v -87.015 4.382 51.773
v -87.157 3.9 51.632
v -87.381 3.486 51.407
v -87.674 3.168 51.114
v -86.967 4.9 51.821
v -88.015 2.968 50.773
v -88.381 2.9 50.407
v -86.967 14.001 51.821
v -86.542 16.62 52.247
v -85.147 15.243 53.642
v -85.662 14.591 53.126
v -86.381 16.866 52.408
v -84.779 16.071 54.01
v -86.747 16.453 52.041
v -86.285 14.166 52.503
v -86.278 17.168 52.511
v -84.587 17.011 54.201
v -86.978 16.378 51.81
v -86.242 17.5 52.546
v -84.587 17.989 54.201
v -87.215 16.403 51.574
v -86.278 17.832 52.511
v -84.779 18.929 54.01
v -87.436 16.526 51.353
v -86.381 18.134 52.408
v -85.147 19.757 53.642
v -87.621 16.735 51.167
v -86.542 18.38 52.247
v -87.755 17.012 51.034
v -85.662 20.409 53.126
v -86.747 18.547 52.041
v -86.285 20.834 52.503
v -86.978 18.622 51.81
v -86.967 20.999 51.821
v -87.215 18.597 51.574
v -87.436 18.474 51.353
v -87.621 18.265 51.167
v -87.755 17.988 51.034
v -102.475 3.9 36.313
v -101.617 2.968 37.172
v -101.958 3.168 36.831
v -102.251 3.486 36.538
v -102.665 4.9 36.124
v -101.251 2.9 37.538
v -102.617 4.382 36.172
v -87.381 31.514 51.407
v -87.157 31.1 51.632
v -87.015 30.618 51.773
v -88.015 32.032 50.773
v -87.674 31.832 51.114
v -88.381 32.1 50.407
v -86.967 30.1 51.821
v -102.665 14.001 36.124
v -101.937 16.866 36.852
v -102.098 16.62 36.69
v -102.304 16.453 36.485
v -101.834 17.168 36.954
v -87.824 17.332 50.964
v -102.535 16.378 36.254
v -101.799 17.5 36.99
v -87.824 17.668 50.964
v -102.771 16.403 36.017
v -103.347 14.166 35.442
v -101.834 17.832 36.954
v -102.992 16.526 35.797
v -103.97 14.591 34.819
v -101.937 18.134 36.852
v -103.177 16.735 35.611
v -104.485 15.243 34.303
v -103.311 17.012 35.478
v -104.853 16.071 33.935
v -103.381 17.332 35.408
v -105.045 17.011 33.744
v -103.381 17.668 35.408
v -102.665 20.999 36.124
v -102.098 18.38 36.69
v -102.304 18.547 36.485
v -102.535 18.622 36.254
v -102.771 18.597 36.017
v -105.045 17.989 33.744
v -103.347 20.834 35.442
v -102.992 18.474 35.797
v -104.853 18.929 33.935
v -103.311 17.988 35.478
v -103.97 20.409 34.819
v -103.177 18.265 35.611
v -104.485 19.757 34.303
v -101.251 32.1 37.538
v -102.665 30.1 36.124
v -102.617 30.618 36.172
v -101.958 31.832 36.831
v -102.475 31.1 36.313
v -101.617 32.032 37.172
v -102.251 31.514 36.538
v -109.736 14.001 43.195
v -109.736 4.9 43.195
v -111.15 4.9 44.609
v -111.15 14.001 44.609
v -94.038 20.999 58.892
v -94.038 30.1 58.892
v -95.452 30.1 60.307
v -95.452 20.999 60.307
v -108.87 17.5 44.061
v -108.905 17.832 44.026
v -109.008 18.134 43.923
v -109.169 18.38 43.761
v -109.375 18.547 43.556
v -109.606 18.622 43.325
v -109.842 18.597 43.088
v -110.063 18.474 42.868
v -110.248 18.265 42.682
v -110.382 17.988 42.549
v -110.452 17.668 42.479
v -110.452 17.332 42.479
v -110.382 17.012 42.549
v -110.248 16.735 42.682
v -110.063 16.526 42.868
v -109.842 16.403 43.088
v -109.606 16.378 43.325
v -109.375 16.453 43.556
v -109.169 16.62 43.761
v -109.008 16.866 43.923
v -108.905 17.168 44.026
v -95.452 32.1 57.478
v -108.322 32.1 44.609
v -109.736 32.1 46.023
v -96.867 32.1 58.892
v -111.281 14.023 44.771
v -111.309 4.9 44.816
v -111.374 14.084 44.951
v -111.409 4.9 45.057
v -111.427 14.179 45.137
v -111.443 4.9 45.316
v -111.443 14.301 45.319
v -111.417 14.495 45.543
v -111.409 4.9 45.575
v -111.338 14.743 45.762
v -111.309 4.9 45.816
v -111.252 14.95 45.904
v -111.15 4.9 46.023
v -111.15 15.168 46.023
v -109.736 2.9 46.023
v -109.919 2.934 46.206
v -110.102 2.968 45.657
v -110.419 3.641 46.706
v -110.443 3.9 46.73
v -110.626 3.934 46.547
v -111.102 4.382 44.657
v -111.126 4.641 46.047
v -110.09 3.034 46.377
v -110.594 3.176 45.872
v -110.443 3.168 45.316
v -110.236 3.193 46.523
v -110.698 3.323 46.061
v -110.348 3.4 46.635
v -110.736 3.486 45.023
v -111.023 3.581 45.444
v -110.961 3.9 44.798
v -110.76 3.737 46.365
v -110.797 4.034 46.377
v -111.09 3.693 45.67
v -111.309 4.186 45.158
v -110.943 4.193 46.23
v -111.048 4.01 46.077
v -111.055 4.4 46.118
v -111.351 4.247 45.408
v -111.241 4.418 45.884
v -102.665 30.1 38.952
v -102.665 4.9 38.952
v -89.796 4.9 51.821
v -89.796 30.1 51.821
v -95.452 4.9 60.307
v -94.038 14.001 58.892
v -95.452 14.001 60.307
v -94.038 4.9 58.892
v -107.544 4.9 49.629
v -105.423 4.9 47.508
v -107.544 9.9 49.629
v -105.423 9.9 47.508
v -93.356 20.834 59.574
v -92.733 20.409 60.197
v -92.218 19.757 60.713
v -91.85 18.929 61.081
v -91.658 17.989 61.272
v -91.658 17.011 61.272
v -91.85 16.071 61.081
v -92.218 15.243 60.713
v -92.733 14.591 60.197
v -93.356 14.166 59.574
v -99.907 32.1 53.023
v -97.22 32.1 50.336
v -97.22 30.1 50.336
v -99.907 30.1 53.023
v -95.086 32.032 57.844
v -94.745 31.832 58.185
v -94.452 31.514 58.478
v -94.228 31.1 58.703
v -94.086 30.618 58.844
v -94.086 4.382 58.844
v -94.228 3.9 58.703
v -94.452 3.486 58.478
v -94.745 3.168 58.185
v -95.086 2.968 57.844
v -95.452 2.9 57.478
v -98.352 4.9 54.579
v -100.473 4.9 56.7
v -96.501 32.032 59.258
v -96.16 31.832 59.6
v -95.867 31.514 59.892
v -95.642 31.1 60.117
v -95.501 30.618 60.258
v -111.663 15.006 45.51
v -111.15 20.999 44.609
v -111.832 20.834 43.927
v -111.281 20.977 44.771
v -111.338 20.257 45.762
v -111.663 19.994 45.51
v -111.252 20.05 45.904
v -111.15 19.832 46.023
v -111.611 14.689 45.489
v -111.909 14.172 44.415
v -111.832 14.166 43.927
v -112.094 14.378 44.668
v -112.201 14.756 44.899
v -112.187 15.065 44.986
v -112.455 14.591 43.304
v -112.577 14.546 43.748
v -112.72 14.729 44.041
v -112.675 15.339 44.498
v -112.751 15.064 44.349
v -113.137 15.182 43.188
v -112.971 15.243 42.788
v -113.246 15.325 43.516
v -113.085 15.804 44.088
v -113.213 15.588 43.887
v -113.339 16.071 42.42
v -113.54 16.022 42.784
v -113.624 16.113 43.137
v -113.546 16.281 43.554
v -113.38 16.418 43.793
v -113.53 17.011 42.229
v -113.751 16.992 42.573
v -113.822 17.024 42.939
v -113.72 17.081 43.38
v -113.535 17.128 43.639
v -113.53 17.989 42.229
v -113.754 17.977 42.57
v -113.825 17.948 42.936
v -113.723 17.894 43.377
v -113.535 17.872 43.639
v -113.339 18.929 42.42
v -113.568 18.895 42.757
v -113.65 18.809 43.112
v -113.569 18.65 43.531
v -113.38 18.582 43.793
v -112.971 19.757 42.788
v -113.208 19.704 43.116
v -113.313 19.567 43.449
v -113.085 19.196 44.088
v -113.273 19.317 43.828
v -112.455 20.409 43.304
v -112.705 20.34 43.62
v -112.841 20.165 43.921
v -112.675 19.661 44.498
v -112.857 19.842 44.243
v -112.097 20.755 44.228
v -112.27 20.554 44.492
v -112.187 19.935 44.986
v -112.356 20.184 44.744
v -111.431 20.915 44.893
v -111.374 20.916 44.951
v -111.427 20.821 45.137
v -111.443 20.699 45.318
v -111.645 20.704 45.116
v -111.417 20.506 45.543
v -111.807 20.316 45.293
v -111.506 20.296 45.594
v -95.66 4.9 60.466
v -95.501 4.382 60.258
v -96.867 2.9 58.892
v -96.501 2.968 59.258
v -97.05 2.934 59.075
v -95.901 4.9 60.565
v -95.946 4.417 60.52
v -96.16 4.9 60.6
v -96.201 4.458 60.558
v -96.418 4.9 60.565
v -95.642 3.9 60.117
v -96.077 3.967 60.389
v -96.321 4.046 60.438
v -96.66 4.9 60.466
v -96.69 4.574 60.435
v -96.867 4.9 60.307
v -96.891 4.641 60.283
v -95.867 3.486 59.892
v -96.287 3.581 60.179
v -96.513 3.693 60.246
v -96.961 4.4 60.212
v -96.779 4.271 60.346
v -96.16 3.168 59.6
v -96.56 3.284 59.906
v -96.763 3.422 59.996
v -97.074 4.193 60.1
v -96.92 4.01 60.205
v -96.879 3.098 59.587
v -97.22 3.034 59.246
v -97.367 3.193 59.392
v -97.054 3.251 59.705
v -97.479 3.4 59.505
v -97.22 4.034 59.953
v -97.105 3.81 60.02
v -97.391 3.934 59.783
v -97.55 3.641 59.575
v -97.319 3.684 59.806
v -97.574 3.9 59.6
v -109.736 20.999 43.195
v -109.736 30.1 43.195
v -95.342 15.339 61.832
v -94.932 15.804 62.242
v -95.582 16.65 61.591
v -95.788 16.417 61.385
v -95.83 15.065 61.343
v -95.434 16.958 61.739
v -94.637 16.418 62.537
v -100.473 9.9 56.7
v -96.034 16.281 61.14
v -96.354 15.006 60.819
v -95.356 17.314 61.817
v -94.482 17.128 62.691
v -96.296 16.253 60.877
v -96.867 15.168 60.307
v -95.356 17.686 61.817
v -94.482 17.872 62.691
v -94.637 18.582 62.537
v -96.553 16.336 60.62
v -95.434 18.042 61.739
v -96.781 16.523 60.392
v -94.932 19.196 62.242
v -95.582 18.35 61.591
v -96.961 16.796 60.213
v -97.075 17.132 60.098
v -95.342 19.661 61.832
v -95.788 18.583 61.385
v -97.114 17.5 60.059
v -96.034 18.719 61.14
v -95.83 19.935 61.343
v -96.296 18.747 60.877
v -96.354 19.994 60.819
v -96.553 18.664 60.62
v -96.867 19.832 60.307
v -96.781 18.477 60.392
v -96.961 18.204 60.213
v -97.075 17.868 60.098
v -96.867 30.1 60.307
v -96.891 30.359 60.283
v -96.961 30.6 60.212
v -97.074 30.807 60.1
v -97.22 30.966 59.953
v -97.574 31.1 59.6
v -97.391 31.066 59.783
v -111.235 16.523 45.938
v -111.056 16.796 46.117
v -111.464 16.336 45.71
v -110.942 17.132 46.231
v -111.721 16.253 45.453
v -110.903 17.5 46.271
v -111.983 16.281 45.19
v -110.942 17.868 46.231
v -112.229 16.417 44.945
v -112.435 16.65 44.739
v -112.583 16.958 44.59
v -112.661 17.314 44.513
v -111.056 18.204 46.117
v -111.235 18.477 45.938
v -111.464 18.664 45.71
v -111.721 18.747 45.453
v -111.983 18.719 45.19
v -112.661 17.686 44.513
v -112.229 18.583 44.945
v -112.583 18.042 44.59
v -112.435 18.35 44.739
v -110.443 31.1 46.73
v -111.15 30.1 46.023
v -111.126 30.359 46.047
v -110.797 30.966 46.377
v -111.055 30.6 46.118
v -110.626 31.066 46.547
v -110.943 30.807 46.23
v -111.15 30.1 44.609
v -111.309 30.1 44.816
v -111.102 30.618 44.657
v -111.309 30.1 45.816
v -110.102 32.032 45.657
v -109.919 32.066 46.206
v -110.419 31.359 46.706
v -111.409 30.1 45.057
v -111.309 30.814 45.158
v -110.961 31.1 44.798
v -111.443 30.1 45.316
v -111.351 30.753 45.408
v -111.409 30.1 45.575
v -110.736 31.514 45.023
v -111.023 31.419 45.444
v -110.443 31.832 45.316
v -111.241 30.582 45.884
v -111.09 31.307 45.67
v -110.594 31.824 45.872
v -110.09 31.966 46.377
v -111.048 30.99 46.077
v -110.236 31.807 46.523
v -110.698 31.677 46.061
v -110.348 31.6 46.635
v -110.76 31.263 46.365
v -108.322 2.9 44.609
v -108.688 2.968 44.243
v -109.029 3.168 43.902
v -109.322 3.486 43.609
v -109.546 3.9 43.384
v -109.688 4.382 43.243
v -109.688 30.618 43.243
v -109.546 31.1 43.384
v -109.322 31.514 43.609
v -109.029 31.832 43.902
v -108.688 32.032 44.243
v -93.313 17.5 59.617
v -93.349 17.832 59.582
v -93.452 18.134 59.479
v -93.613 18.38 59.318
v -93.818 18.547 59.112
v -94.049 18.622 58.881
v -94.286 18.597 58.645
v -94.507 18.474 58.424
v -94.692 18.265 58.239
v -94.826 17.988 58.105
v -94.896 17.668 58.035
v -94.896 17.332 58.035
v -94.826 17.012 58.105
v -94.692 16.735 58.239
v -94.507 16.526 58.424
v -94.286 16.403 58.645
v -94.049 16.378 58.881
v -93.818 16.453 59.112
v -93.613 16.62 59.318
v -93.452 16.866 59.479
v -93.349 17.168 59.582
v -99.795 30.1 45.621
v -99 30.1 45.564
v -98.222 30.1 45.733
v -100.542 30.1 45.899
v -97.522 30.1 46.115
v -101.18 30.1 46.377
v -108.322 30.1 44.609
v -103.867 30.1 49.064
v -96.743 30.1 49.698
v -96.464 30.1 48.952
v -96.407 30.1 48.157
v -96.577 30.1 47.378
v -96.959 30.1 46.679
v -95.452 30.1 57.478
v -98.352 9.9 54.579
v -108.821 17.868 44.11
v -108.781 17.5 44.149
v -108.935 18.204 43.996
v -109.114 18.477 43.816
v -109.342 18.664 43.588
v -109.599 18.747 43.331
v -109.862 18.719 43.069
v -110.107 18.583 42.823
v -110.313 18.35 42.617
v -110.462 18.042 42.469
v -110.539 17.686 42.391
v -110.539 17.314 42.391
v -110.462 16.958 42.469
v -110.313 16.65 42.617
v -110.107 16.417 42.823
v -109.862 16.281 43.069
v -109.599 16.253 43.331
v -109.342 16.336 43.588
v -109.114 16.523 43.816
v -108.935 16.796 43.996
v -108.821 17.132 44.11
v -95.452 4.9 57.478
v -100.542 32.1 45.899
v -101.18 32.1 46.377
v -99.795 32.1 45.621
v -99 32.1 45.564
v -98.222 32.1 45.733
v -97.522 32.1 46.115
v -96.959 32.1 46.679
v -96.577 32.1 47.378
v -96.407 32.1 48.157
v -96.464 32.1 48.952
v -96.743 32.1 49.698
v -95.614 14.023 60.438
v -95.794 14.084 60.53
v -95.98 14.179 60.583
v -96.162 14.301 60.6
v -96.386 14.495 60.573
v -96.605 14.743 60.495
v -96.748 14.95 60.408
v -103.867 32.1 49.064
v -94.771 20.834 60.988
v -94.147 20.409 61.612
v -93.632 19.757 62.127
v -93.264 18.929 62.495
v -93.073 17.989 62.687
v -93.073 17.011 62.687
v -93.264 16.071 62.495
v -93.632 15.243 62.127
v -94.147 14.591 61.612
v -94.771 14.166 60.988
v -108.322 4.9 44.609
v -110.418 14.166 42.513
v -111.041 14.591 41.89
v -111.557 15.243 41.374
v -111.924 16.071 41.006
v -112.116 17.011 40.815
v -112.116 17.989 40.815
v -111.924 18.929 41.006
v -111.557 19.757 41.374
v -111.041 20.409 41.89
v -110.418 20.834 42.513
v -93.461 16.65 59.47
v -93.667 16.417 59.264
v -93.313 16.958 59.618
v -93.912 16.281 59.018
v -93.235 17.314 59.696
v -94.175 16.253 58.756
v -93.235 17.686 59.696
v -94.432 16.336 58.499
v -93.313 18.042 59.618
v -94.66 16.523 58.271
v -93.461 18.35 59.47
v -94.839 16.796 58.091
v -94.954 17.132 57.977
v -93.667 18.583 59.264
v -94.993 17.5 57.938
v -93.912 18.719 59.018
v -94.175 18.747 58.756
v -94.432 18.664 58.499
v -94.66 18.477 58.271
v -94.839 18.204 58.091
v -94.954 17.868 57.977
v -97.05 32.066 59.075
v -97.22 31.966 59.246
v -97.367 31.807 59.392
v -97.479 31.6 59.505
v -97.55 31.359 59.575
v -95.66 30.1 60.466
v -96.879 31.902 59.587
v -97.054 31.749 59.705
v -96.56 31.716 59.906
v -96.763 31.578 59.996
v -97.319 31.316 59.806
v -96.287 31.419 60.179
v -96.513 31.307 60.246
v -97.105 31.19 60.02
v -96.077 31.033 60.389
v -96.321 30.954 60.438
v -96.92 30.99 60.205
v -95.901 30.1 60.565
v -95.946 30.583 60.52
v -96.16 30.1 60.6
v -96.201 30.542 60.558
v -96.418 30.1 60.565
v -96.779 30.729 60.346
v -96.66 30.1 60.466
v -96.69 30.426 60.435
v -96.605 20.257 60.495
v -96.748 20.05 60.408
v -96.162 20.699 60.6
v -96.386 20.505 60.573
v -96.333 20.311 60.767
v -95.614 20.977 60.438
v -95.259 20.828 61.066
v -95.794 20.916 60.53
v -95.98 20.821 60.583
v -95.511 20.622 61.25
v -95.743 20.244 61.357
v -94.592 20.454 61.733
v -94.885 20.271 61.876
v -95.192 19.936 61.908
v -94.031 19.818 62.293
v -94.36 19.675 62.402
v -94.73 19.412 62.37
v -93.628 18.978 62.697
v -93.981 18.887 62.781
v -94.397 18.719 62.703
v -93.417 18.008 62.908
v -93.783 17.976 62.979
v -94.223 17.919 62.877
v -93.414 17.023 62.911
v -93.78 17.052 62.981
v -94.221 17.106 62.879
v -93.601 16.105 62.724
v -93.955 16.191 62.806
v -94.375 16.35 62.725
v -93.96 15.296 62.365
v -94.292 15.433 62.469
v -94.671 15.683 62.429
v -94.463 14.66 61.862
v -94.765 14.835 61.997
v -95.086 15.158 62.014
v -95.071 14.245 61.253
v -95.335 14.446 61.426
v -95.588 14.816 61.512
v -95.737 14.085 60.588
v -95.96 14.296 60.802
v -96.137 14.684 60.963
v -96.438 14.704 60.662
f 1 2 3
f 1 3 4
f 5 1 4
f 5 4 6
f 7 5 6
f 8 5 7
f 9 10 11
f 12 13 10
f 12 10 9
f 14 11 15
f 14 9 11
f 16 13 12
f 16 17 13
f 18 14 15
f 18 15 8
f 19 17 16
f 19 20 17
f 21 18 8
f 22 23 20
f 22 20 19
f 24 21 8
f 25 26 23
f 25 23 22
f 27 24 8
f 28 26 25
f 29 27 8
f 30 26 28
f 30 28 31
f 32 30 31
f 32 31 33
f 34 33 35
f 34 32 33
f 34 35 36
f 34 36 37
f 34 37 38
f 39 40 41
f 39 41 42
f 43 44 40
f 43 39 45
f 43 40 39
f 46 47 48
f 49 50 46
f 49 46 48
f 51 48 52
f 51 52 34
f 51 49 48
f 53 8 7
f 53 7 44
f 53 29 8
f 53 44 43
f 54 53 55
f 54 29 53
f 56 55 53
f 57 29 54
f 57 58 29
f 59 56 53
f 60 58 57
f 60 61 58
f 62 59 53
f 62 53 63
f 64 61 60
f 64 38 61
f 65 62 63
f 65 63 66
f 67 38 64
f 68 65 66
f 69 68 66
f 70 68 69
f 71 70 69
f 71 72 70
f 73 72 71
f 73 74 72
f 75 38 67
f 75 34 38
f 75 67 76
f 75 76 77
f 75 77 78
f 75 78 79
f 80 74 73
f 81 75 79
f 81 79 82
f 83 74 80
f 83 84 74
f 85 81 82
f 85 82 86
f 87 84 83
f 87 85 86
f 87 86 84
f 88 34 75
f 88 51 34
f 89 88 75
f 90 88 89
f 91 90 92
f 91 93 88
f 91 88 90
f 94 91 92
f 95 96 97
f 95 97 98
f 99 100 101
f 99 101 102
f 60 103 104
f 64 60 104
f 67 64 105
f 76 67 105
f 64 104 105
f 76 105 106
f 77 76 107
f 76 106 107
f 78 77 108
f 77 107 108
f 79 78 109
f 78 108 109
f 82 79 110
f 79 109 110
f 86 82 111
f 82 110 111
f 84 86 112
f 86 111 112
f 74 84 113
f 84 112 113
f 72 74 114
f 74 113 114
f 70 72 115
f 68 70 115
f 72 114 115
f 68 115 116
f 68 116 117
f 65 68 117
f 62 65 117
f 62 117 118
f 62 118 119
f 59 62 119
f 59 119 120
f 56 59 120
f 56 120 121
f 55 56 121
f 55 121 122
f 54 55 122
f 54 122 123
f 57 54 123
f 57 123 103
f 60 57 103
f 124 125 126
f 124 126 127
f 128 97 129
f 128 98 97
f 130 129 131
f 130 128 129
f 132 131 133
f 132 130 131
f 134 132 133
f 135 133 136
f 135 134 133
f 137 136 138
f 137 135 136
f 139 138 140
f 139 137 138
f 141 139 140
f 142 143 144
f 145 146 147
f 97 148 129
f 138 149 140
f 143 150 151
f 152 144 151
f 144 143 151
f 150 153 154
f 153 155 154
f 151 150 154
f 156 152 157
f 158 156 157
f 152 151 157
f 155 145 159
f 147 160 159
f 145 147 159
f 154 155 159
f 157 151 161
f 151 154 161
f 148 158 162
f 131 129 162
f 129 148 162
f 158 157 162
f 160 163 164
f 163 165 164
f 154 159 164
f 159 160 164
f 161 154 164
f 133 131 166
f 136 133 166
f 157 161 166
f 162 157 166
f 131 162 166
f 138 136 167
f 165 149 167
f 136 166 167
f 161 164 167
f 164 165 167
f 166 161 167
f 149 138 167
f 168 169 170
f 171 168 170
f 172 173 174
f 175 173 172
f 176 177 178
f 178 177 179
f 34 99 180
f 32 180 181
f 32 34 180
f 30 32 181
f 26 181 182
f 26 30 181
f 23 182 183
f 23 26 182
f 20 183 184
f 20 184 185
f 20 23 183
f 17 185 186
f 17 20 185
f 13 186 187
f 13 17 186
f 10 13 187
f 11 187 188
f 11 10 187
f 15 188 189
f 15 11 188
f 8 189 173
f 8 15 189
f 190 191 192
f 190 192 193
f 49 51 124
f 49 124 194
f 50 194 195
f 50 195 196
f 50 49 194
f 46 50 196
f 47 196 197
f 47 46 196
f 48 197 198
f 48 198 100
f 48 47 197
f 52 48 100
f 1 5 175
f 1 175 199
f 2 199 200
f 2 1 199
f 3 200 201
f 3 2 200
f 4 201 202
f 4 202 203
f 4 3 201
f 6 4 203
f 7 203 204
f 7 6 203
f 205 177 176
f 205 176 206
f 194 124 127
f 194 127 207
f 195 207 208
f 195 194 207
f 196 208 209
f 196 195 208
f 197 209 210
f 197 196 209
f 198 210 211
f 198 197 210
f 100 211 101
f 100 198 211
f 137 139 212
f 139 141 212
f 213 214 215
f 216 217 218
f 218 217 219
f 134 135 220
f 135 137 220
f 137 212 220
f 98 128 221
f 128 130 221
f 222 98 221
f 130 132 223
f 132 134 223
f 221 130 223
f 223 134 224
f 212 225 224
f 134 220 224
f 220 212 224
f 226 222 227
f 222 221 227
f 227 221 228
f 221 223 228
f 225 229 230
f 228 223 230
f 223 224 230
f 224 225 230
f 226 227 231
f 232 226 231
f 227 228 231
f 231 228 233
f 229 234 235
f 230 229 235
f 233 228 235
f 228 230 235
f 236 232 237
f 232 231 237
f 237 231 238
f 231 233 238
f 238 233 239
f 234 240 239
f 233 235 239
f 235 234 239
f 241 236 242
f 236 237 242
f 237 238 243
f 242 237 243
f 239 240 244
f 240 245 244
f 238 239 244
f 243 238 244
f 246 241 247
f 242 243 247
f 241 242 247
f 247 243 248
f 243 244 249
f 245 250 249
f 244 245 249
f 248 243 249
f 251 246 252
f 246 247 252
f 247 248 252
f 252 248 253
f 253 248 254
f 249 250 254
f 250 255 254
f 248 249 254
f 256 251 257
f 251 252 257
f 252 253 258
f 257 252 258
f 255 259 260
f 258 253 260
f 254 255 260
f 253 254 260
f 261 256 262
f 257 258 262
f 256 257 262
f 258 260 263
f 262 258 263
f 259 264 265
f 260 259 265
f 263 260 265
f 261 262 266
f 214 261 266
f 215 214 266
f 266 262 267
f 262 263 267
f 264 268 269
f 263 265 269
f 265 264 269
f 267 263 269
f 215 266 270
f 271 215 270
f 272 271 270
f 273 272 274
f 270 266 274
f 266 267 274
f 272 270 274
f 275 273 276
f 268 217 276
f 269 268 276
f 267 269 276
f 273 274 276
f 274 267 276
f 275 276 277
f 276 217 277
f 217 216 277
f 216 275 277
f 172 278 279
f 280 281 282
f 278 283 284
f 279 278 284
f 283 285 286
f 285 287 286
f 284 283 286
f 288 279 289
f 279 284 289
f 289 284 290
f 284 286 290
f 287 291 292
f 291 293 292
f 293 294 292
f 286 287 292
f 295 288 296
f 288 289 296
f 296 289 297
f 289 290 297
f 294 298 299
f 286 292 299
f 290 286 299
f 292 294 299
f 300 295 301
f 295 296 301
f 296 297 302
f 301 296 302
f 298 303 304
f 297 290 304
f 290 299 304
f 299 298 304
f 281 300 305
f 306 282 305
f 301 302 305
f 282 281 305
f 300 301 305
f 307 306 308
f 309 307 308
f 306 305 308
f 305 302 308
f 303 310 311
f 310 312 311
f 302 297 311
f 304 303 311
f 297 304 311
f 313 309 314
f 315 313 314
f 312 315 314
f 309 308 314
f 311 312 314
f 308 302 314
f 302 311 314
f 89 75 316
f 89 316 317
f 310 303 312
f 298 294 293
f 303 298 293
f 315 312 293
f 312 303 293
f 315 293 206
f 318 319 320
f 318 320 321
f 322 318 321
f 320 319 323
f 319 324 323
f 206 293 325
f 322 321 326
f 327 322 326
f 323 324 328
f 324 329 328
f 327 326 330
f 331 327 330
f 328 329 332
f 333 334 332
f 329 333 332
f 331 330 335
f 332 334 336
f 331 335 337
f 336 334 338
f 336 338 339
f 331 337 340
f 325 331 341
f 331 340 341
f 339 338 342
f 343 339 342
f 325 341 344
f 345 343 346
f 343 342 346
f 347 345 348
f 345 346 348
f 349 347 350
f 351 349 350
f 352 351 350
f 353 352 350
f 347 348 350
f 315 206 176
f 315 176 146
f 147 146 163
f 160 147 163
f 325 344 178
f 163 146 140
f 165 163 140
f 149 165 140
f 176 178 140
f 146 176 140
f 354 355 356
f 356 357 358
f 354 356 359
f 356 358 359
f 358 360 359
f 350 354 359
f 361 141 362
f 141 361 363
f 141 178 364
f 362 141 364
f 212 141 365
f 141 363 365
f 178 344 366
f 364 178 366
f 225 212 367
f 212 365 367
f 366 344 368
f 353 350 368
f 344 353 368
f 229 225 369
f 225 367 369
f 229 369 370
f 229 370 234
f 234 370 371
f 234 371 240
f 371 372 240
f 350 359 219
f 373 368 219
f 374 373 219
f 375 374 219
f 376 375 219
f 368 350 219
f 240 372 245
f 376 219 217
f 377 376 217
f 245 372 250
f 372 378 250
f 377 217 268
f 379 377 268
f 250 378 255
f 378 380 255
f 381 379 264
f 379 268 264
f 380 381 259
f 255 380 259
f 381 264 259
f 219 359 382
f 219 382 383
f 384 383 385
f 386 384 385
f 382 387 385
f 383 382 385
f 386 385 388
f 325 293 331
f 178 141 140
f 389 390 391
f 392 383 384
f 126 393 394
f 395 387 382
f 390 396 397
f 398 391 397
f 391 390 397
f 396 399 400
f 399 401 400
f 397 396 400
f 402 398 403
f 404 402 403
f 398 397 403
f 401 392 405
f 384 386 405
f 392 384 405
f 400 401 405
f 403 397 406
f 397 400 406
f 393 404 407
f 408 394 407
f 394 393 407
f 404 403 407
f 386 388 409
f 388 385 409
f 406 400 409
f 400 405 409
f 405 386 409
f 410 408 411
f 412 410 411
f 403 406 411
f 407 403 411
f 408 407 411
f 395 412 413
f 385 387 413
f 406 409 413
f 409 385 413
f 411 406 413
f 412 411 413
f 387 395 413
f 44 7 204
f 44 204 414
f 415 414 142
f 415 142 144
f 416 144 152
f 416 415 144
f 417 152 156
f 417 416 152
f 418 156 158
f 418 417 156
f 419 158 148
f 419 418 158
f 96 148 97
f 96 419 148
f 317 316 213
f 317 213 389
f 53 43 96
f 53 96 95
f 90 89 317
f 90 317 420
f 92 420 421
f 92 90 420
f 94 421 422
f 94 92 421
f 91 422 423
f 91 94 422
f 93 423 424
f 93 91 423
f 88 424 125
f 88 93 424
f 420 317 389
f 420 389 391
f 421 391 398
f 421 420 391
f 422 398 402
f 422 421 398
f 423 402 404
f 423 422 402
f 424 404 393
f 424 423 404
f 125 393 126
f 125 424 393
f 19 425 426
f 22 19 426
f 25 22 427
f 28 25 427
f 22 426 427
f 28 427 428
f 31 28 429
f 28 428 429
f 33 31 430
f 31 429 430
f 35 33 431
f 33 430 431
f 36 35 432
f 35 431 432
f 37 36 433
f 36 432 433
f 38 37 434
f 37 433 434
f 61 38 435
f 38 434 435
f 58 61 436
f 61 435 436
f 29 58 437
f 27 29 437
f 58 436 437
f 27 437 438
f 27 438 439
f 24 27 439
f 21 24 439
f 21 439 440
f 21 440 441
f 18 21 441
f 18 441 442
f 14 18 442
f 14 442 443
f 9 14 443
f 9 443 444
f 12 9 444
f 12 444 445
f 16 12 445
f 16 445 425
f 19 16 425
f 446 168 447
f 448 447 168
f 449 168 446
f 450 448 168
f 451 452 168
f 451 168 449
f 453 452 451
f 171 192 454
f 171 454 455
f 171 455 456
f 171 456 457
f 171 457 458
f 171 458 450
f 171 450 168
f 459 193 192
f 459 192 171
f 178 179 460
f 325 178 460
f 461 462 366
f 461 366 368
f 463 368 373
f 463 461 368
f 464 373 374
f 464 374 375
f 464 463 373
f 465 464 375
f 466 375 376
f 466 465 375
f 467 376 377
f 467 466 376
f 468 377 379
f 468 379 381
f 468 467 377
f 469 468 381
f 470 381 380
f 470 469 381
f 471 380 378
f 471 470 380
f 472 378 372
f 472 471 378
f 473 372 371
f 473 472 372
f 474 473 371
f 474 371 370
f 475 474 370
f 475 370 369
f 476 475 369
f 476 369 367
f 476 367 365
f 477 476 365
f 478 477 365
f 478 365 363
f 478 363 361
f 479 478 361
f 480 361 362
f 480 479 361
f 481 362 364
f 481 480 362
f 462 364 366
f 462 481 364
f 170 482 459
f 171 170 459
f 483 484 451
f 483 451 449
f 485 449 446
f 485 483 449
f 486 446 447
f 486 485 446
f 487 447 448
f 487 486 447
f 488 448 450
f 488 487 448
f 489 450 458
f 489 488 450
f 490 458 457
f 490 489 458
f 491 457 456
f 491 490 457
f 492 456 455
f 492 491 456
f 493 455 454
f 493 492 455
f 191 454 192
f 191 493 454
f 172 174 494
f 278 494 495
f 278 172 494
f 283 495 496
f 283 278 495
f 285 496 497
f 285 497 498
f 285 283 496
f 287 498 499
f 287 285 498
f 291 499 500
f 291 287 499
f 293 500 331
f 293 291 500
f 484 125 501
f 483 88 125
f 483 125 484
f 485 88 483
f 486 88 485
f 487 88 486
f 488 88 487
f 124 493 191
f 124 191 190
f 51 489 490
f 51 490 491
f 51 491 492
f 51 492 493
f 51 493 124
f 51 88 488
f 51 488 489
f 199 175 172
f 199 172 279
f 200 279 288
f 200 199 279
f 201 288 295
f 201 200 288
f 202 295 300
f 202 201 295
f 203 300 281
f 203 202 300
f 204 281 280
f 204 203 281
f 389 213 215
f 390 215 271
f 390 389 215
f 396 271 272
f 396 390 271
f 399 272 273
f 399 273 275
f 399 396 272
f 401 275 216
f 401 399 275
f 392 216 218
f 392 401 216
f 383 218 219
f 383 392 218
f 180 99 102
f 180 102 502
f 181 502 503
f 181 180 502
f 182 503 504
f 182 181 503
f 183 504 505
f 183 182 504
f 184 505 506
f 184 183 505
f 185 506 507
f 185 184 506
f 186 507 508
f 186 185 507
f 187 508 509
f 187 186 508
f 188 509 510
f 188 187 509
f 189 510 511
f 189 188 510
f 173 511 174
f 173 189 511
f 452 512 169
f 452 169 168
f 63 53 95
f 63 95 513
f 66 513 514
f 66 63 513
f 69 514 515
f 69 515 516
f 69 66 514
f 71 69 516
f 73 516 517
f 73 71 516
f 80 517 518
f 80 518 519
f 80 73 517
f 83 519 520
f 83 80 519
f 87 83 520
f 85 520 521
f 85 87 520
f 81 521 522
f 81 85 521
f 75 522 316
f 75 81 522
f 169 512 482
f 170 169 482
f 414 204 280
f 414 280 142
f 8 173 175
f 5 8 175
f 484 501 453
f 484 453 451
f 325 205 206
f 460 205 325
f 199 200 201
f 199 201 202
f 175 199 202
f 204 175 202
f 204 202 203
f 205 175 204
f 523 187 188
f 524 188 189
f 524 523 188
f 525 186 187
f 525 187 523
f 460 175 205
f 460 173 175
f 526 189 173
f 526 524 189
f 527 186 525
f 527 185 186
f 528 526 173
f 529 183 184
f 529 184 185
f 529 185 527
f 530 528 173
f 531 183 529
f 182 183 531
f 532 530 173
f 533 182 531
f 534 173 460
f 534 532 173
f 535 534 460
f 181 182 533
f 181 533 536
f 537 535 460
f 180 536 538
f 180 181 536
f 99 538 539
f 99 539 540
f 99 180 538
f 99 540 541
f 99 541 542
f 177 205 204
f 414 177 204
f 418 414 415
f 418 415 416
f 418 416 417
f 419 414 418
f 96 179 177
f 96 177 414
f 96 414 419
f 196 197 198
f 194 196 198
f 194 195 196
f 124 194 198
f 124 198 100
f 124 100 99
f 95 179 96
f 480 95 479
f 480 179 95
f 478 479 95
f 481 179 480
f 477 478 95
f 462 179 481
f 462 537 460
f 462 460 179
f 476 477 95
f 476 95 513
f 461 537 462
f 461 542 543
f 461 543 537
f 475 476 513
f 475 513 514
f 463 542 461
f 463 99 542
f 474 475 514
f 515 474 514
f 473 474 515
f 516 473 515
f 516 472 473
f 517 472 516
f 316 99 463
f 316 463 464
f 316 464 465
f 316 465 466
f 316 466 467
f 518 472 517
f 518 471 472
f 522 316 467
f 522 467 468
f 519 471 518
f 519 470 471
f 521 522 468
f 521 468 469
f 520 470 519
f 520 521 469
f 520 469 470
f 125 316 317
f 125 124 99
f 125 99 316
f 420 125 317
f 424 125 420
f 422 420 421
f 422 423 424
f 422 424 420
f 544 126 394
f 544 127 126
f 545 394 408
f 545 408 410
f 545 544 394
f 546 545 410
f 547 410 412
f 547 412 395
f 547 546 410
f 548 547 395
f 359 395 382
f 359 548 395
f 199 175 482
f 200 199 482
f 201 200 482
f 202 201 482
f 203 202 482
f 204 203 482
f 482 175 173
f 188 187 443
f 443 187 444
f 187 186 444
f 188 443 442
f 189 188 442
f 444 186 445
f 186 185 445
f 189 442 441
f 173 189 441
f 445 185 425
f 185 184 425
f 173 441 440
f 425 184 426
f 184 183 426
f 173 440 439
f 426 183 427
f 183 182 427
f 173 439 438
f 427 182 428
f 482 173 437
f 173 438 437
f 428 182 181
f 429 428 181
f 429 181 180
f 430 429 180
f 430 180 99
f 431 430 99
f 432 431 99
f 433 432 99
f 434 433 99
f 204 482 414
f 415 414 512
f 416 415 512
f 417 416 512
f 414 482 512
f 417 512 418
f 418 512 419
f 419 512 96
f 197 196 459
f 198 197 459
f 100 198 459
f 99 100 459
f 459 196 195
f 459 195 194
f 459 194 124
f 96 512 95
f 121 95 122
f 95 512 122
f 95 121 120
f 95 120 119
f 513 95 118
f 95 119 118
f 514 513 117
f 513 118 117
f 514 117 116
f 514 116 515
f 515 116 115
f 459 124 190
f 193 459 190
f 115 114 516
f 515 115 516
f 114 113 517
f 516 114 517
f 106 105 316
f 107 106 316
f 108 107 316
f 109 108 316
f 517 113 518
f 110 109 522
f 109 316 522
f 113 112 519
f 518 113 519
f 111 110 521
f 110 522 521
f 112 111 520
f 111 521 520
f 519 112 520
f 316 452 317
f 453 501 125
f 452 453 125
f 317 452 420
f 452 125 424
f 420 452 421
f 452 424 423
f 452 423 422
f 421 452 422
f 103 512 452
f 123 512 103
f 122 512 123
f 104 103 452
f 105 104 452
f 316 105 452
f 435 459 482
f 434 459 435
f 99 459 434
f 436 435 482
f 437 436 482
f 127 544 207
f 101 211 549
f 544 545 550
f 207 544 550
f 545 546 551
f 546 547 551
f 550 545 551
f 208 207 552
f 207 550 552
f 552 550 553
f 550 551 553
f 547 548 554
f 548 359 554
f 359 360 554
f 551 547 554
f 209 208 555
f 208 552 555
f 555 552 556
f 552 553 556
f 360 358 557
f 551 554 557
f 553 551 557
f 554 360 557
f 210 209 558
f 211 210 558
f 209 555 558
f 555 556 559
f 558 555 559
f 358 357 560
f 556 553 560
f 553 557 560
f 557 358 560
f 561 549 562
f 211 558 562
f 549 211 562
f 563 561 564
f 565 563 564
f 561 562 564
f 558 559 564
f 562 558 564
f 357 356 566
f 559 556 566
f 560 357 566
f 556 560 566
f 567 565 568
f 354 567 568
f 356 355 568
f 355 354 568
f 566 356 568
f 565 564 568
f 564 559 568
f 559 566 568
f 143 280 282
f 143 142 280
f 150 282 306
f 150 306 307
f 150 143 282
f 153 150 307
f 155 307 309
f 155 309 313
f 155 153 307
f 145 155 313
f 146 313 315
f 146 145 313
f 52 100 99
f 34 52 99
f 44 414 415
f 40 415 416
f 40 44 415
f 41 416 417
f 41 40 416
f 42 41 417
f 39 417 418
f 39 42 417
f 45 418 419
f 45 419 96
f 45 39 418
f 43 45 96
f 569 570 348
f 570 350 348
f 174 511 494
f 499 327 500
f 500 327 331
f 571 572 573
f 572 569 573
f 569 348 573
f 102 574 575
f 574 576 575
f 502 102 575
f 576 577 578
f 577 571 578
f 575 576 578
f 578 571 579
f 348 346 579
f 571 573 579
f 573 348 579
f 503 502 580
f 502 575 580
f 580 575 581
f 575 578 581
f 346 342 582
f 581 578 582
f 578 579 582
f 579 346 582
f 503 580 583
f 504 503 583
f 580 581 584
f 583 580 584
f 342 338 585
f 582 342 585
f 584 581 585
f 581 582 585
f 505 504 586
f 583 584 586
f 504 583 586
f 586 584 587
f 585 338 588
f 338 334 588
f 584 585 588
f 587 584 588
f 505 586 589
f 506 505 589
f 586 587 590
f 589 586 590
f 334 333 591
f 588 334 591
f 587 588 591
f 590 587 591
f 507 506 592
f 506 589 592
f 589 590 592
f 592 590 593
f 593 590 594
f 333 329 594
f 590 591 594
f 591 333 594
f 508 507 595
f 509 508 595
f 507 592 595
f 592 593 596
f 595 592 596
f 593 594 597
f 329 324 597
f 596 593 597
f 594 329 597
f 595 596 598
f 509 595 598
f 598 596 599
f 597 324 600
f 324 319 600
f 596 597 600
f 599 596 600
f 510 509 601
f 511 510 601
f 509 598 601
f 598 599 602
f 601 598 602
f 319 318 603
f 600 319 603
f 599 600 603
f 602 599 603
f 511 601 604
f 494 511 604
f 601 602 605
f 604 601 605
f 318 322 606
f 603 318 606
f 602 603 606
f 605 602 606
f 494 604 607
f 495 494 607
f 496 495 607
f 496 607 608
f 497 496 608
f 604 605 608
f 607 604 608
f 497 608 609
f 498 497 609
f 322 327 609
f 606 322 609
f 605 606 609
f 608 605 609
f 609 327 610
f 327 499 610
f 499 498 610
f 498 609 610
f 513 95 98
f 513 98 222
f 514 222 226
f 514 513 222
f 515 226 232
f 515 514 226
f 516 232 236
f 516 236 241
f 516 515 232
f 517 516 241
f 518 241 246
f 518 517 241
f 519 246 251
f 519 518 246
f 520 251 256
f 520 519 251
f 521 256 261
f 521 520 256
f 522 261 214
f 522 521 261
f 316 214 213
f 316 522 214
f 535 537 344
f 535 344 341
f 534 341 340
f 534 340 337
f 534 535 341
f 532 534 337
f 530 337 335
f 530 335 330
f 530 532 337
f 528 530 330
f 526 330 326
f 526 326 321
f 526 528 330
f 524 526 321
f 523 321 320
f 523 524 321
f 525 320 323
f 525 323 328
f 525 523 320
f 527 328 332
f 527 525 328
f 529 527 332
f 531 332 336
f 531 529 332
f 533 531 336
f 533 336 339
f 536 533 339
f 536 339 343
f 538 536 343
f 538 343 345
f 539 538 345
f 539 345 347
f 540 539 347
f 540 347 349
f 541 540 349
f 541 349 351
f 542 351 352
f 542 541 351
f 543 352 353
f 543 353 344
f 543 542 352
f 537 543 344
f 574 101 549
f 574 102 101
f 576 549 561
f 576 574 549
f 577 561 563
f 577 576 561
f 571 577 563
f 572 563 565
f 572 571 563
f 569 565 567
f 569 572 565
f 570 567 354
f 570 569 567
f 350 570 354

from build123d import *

# Parameters (mm, degrees)
BOSS_EXTRUDE1_DEPTH = 10
CUT_EXTRUDE1_REACH  = 66.268
SKETCH2_R           = 1.125
SKETCH3_W           = 18.2
SKETCH3_H           = 25.2
CUT_EXTRUDE2_DEPTH  = 8
CUT_EXTRUDE3_REACH  = 133.093
SKETCH5_R           = 1.25
SKETCH5_W           = 10
SKETCH5_H           = 5
BOSS_EXTRUDE2_DEPTH = 3
FILLET1_R           = 1


with BuildPart() as part:
    # Sketch1 → Boss-Extrude1 (new body)
    with BuildSketch(Plane(origin=(-69.394235316, 0, 69.394235316), x_dir=(0.7071067811865521, 0, 0.707106781186543), z_dir=(-0.707106781186543, 0, 0.7071067811865521))):
        with BuildLine():
            Line((-47.051825189, 20.998571137), (-47.051825189, 30.1))
            ThreePointArc((-47.051825189, 30.1), (-46.466038752, 31.514213562), (-45.051825189, 32.1))
            Line((-45.051825189, 32.1), (-26.851825189, 32.1))
            ThreePointArc((-26.851825189, 32.1), (-25.437611627, 31.514213562), (-24.851825189, 30.1))
            Line((-24.851825189, 30.1), (-24.851825189, 20.998571137))
            ThreePointArc((-24.851825189, 20.998571137), (-21.451825189, 17.5), (-24.851825189, 14.001428863))
            Line((-24.851825189, 14.001428863), (-24.851825189, 4.9))
            ThreePointArc((-24.851825189, 4.9), (-25.437611627, 3.485786438), (-26.851825189, 2.9))
            Line((-26.851825189, 2.9), (-45.051825189, 2.9))
            ThreePointArc((-45.051825189, 2.9), (-46.466038752, 3.485786438), (-47.051825189, 4.9))
            Line((-47.051825189, 4.9), (-47.051825189, 14.001428863))
            ThreePointArc((-47.051825189, 14.001428863), (-50.451825189, 17.5), (-47.051825189, 20.998571137))
        make_face()
    extrude(amount=BOSS_EXTRUDE1_DEPTH)

    # Sketch2 → Cut-Extrude1 (cut, up to next)
    with BuildSketch(Plane(origin=(-76.465303128, 0, 76.465303128), x_dir=(0.707106781186552, 0, 0.707106781186543), z_dir=(-0.707106781186543, 0, 0.707106781186552)), mode=Mode.PRIVATE) as cut_extrude1_sk1:
        with Locations((-46.951825189, 17.5)):
            Circle(SKETCH2_R)
    cut_extrude1_tool1 = extrude(cut_extrude1_sk1.sketch, amount=-CUT_EXTRUDE1_REACH, mode=Mode.PRIVATE) & part.part
    # Sketch2 → Cut-Extrude1 (cut, up to next)
    with BuildSketch(Plane(origin=(-76.465303128, 0, 76.465303128), x_dir=(0.707106781186552, 0, 0.707106781186543), z_dir=(-0.707106781186543, 0, 0.707106781186552)), mode=Mode.PRIVATE) as cut_extrude1_sk2:
        with Locations((-24.951825189, 17.5)):
            Circle(SKETCH2_R)
    cut_extrude1_tool2 = extrude(cut_extrude1_sk2.sketch, amount=-CUT_EXTRUDE1_REACH, mode=Mode.PRIVATE) & part.part
    add(cut_extrude1_tool1.solids().sort_by_distance((-109.665257, 17.5, 43.265349))[0], mode=Mode.SUBTRACT)
    add(cut_extrude1_tool2.solids().sort_by_distance((-94.108908, 17.5, 58.821698))[0], mode=Mode.SUBTRACT)

    # Sketch3 → Cut-Extrude2 (cut)
    with BuildSketch(Plane(origin=(-76.465303128, 0, 76.465303128), x_dir=(0.707106781186552, 0, 0.707106781186543), z_dir=(-0.707106781186543, 0, 0.707106781186552))):
        with Locations((-35.951825189, 17.5)):
            Rectangle(SKETCH3_W, SKETCH3_H)
    extrude(amount=-CUT_EXTRUDE2_DEPTH, mode=Mode.SUBTRACT)

    # Sketch4 → Cut-Extrude3 (cut, up to next)
    with BuildSketch(Plane(origin=(0, 32.1, 0), x_dir=(1, 0, 0), z_dir=(0, 1, 0)), mode=Mode.PRIVATE) as cut_extrude3_sk1:
        with BuildLine():
            Line((-103.866981503, -49.063624754), (-101.179975734, -46.376618985))
            ThreePointArc((-101.179975734, -46.376618985), (-97.22017776, -46.376618985), (-97.22017776, -50.33641696))
            Line((-97.22017776, -50.33641696), (-99.907183528, -53.023422728))
            Line((-99.907183528, -53.023422728), (-103.866981503, -49.063624754))
        make_face()
    cut_extrude3_tool1 = extrude(cut_extrude3_sk1.sketch, amount=-CUT_EXTRUDE3_REACH, mode=Mode.PRIVATE) & part.part
    add(cut_extrude3_tool1.solids().sort_by_distance((-99.743058, 32.1, 48.899499))[0], mode=Mode.SUBTRACT)


with BuildPart() as body_2:
    # Sketch5 → Boss-Extrude2 (new body)
    with BuildSketch(Plane(origin=(-76.465303128, 0, 76.465303128), x_dir=(0.707106781186552, 0, 0.707106781186543), z_dir=(-0.707106781186543, 0, 0.707106781186552))):
        with BuildLine():
            Line((-47.051825189, 20.998571137), (-47.051825189, 30.1))
            ThreePointArc((-47.051825189, 30.1), (-46.466038752, 31.514213562), (-45.051825189, 32.1))
            Line((-45.051825189, 32.1), (-26.851825189, 32.1))
            ThreePointArc((-26.851825189, 32.1), (-25.437611627, 31.514213562), (-24.851825189, 30.1))
            Line((-24.851825189, 30.1), (-24.851825189, 20.998571137))
            ThreePointArc((-24.851825189, 20.998571137), (-21.451825189, 17.5), (-24.851825189, 14.001428863))
            Line((-24.851825189, 14.001428863), (-24.851825189, 4.9))
            ThreePointArc((-24.851825189, 4.9), (-25.437611627, 3.485786438), (-26.851825189, 2.9))
            Line((-26.851825189, 2.9), (-45.051825189, 2.9))
            ThreePointArc((-45.051825189, 2.9), (-46.466038752, 3.485786438), (-47.051825189, 4.9))
            Line((-47.051825189, 4.9), (-47.051825189, 14.001428863))
            ThreePointArc((-47.051825189, 14.001428863), (-50.451825189, 17.5), (-47.051825189, 20.998571137))
        make_face()
        with Locations((-46.951825189, 17.5)):
            Circle(SKETCH5_R, mode=Mode.SUBTRACT)
        with Locations(Location((-24.951825189, 17.5, 0), (0, 0, 180))):
            Circle(SKETCH5_R, mode=Mode.SUBTRACT)
        with Locations((-35.951825189, 7.4)):
            Rectangle(SKETCH5_W, SKETCH5_H, mode=Mode.SUBTRACT)
    extrude(amount=BOSS_EXTRUDE2_DEPTH)

    # Fillet1
    fillet1_edges = [body_2.edges().sort_by_distance(p)[0] for p in [
        (-111.443074568, 3.485786438, 45.730172376),
        (-104.008402859, 2.9, 53.164844084),
        (-96.57373115, 3.485786438, 60.599515793),
        (-96.159517588, 9.450714432, 61.013729356),
        (-93.755354532, 17.5, 63.417892412),
        (-96.159517588, 25.549285568, 61.013729356),
        (-96.57373115, 31.514213562, 60.599515793),
        (-104.008402859, 32.1, 53.164844084),
        (-111.443074568, 31.514213562, 45.730172376),
        (-111.85728813, 25.549285568, 45.315958813),
        (-114.261451186, 17.5, 42.911795757),
        (-111.85728813, 9.450714432, 45.315958813),
    ]]
    fillet(fillet1_edges, radius=FILLET1_R)


solid = Compound([part.part, body_2.part])
